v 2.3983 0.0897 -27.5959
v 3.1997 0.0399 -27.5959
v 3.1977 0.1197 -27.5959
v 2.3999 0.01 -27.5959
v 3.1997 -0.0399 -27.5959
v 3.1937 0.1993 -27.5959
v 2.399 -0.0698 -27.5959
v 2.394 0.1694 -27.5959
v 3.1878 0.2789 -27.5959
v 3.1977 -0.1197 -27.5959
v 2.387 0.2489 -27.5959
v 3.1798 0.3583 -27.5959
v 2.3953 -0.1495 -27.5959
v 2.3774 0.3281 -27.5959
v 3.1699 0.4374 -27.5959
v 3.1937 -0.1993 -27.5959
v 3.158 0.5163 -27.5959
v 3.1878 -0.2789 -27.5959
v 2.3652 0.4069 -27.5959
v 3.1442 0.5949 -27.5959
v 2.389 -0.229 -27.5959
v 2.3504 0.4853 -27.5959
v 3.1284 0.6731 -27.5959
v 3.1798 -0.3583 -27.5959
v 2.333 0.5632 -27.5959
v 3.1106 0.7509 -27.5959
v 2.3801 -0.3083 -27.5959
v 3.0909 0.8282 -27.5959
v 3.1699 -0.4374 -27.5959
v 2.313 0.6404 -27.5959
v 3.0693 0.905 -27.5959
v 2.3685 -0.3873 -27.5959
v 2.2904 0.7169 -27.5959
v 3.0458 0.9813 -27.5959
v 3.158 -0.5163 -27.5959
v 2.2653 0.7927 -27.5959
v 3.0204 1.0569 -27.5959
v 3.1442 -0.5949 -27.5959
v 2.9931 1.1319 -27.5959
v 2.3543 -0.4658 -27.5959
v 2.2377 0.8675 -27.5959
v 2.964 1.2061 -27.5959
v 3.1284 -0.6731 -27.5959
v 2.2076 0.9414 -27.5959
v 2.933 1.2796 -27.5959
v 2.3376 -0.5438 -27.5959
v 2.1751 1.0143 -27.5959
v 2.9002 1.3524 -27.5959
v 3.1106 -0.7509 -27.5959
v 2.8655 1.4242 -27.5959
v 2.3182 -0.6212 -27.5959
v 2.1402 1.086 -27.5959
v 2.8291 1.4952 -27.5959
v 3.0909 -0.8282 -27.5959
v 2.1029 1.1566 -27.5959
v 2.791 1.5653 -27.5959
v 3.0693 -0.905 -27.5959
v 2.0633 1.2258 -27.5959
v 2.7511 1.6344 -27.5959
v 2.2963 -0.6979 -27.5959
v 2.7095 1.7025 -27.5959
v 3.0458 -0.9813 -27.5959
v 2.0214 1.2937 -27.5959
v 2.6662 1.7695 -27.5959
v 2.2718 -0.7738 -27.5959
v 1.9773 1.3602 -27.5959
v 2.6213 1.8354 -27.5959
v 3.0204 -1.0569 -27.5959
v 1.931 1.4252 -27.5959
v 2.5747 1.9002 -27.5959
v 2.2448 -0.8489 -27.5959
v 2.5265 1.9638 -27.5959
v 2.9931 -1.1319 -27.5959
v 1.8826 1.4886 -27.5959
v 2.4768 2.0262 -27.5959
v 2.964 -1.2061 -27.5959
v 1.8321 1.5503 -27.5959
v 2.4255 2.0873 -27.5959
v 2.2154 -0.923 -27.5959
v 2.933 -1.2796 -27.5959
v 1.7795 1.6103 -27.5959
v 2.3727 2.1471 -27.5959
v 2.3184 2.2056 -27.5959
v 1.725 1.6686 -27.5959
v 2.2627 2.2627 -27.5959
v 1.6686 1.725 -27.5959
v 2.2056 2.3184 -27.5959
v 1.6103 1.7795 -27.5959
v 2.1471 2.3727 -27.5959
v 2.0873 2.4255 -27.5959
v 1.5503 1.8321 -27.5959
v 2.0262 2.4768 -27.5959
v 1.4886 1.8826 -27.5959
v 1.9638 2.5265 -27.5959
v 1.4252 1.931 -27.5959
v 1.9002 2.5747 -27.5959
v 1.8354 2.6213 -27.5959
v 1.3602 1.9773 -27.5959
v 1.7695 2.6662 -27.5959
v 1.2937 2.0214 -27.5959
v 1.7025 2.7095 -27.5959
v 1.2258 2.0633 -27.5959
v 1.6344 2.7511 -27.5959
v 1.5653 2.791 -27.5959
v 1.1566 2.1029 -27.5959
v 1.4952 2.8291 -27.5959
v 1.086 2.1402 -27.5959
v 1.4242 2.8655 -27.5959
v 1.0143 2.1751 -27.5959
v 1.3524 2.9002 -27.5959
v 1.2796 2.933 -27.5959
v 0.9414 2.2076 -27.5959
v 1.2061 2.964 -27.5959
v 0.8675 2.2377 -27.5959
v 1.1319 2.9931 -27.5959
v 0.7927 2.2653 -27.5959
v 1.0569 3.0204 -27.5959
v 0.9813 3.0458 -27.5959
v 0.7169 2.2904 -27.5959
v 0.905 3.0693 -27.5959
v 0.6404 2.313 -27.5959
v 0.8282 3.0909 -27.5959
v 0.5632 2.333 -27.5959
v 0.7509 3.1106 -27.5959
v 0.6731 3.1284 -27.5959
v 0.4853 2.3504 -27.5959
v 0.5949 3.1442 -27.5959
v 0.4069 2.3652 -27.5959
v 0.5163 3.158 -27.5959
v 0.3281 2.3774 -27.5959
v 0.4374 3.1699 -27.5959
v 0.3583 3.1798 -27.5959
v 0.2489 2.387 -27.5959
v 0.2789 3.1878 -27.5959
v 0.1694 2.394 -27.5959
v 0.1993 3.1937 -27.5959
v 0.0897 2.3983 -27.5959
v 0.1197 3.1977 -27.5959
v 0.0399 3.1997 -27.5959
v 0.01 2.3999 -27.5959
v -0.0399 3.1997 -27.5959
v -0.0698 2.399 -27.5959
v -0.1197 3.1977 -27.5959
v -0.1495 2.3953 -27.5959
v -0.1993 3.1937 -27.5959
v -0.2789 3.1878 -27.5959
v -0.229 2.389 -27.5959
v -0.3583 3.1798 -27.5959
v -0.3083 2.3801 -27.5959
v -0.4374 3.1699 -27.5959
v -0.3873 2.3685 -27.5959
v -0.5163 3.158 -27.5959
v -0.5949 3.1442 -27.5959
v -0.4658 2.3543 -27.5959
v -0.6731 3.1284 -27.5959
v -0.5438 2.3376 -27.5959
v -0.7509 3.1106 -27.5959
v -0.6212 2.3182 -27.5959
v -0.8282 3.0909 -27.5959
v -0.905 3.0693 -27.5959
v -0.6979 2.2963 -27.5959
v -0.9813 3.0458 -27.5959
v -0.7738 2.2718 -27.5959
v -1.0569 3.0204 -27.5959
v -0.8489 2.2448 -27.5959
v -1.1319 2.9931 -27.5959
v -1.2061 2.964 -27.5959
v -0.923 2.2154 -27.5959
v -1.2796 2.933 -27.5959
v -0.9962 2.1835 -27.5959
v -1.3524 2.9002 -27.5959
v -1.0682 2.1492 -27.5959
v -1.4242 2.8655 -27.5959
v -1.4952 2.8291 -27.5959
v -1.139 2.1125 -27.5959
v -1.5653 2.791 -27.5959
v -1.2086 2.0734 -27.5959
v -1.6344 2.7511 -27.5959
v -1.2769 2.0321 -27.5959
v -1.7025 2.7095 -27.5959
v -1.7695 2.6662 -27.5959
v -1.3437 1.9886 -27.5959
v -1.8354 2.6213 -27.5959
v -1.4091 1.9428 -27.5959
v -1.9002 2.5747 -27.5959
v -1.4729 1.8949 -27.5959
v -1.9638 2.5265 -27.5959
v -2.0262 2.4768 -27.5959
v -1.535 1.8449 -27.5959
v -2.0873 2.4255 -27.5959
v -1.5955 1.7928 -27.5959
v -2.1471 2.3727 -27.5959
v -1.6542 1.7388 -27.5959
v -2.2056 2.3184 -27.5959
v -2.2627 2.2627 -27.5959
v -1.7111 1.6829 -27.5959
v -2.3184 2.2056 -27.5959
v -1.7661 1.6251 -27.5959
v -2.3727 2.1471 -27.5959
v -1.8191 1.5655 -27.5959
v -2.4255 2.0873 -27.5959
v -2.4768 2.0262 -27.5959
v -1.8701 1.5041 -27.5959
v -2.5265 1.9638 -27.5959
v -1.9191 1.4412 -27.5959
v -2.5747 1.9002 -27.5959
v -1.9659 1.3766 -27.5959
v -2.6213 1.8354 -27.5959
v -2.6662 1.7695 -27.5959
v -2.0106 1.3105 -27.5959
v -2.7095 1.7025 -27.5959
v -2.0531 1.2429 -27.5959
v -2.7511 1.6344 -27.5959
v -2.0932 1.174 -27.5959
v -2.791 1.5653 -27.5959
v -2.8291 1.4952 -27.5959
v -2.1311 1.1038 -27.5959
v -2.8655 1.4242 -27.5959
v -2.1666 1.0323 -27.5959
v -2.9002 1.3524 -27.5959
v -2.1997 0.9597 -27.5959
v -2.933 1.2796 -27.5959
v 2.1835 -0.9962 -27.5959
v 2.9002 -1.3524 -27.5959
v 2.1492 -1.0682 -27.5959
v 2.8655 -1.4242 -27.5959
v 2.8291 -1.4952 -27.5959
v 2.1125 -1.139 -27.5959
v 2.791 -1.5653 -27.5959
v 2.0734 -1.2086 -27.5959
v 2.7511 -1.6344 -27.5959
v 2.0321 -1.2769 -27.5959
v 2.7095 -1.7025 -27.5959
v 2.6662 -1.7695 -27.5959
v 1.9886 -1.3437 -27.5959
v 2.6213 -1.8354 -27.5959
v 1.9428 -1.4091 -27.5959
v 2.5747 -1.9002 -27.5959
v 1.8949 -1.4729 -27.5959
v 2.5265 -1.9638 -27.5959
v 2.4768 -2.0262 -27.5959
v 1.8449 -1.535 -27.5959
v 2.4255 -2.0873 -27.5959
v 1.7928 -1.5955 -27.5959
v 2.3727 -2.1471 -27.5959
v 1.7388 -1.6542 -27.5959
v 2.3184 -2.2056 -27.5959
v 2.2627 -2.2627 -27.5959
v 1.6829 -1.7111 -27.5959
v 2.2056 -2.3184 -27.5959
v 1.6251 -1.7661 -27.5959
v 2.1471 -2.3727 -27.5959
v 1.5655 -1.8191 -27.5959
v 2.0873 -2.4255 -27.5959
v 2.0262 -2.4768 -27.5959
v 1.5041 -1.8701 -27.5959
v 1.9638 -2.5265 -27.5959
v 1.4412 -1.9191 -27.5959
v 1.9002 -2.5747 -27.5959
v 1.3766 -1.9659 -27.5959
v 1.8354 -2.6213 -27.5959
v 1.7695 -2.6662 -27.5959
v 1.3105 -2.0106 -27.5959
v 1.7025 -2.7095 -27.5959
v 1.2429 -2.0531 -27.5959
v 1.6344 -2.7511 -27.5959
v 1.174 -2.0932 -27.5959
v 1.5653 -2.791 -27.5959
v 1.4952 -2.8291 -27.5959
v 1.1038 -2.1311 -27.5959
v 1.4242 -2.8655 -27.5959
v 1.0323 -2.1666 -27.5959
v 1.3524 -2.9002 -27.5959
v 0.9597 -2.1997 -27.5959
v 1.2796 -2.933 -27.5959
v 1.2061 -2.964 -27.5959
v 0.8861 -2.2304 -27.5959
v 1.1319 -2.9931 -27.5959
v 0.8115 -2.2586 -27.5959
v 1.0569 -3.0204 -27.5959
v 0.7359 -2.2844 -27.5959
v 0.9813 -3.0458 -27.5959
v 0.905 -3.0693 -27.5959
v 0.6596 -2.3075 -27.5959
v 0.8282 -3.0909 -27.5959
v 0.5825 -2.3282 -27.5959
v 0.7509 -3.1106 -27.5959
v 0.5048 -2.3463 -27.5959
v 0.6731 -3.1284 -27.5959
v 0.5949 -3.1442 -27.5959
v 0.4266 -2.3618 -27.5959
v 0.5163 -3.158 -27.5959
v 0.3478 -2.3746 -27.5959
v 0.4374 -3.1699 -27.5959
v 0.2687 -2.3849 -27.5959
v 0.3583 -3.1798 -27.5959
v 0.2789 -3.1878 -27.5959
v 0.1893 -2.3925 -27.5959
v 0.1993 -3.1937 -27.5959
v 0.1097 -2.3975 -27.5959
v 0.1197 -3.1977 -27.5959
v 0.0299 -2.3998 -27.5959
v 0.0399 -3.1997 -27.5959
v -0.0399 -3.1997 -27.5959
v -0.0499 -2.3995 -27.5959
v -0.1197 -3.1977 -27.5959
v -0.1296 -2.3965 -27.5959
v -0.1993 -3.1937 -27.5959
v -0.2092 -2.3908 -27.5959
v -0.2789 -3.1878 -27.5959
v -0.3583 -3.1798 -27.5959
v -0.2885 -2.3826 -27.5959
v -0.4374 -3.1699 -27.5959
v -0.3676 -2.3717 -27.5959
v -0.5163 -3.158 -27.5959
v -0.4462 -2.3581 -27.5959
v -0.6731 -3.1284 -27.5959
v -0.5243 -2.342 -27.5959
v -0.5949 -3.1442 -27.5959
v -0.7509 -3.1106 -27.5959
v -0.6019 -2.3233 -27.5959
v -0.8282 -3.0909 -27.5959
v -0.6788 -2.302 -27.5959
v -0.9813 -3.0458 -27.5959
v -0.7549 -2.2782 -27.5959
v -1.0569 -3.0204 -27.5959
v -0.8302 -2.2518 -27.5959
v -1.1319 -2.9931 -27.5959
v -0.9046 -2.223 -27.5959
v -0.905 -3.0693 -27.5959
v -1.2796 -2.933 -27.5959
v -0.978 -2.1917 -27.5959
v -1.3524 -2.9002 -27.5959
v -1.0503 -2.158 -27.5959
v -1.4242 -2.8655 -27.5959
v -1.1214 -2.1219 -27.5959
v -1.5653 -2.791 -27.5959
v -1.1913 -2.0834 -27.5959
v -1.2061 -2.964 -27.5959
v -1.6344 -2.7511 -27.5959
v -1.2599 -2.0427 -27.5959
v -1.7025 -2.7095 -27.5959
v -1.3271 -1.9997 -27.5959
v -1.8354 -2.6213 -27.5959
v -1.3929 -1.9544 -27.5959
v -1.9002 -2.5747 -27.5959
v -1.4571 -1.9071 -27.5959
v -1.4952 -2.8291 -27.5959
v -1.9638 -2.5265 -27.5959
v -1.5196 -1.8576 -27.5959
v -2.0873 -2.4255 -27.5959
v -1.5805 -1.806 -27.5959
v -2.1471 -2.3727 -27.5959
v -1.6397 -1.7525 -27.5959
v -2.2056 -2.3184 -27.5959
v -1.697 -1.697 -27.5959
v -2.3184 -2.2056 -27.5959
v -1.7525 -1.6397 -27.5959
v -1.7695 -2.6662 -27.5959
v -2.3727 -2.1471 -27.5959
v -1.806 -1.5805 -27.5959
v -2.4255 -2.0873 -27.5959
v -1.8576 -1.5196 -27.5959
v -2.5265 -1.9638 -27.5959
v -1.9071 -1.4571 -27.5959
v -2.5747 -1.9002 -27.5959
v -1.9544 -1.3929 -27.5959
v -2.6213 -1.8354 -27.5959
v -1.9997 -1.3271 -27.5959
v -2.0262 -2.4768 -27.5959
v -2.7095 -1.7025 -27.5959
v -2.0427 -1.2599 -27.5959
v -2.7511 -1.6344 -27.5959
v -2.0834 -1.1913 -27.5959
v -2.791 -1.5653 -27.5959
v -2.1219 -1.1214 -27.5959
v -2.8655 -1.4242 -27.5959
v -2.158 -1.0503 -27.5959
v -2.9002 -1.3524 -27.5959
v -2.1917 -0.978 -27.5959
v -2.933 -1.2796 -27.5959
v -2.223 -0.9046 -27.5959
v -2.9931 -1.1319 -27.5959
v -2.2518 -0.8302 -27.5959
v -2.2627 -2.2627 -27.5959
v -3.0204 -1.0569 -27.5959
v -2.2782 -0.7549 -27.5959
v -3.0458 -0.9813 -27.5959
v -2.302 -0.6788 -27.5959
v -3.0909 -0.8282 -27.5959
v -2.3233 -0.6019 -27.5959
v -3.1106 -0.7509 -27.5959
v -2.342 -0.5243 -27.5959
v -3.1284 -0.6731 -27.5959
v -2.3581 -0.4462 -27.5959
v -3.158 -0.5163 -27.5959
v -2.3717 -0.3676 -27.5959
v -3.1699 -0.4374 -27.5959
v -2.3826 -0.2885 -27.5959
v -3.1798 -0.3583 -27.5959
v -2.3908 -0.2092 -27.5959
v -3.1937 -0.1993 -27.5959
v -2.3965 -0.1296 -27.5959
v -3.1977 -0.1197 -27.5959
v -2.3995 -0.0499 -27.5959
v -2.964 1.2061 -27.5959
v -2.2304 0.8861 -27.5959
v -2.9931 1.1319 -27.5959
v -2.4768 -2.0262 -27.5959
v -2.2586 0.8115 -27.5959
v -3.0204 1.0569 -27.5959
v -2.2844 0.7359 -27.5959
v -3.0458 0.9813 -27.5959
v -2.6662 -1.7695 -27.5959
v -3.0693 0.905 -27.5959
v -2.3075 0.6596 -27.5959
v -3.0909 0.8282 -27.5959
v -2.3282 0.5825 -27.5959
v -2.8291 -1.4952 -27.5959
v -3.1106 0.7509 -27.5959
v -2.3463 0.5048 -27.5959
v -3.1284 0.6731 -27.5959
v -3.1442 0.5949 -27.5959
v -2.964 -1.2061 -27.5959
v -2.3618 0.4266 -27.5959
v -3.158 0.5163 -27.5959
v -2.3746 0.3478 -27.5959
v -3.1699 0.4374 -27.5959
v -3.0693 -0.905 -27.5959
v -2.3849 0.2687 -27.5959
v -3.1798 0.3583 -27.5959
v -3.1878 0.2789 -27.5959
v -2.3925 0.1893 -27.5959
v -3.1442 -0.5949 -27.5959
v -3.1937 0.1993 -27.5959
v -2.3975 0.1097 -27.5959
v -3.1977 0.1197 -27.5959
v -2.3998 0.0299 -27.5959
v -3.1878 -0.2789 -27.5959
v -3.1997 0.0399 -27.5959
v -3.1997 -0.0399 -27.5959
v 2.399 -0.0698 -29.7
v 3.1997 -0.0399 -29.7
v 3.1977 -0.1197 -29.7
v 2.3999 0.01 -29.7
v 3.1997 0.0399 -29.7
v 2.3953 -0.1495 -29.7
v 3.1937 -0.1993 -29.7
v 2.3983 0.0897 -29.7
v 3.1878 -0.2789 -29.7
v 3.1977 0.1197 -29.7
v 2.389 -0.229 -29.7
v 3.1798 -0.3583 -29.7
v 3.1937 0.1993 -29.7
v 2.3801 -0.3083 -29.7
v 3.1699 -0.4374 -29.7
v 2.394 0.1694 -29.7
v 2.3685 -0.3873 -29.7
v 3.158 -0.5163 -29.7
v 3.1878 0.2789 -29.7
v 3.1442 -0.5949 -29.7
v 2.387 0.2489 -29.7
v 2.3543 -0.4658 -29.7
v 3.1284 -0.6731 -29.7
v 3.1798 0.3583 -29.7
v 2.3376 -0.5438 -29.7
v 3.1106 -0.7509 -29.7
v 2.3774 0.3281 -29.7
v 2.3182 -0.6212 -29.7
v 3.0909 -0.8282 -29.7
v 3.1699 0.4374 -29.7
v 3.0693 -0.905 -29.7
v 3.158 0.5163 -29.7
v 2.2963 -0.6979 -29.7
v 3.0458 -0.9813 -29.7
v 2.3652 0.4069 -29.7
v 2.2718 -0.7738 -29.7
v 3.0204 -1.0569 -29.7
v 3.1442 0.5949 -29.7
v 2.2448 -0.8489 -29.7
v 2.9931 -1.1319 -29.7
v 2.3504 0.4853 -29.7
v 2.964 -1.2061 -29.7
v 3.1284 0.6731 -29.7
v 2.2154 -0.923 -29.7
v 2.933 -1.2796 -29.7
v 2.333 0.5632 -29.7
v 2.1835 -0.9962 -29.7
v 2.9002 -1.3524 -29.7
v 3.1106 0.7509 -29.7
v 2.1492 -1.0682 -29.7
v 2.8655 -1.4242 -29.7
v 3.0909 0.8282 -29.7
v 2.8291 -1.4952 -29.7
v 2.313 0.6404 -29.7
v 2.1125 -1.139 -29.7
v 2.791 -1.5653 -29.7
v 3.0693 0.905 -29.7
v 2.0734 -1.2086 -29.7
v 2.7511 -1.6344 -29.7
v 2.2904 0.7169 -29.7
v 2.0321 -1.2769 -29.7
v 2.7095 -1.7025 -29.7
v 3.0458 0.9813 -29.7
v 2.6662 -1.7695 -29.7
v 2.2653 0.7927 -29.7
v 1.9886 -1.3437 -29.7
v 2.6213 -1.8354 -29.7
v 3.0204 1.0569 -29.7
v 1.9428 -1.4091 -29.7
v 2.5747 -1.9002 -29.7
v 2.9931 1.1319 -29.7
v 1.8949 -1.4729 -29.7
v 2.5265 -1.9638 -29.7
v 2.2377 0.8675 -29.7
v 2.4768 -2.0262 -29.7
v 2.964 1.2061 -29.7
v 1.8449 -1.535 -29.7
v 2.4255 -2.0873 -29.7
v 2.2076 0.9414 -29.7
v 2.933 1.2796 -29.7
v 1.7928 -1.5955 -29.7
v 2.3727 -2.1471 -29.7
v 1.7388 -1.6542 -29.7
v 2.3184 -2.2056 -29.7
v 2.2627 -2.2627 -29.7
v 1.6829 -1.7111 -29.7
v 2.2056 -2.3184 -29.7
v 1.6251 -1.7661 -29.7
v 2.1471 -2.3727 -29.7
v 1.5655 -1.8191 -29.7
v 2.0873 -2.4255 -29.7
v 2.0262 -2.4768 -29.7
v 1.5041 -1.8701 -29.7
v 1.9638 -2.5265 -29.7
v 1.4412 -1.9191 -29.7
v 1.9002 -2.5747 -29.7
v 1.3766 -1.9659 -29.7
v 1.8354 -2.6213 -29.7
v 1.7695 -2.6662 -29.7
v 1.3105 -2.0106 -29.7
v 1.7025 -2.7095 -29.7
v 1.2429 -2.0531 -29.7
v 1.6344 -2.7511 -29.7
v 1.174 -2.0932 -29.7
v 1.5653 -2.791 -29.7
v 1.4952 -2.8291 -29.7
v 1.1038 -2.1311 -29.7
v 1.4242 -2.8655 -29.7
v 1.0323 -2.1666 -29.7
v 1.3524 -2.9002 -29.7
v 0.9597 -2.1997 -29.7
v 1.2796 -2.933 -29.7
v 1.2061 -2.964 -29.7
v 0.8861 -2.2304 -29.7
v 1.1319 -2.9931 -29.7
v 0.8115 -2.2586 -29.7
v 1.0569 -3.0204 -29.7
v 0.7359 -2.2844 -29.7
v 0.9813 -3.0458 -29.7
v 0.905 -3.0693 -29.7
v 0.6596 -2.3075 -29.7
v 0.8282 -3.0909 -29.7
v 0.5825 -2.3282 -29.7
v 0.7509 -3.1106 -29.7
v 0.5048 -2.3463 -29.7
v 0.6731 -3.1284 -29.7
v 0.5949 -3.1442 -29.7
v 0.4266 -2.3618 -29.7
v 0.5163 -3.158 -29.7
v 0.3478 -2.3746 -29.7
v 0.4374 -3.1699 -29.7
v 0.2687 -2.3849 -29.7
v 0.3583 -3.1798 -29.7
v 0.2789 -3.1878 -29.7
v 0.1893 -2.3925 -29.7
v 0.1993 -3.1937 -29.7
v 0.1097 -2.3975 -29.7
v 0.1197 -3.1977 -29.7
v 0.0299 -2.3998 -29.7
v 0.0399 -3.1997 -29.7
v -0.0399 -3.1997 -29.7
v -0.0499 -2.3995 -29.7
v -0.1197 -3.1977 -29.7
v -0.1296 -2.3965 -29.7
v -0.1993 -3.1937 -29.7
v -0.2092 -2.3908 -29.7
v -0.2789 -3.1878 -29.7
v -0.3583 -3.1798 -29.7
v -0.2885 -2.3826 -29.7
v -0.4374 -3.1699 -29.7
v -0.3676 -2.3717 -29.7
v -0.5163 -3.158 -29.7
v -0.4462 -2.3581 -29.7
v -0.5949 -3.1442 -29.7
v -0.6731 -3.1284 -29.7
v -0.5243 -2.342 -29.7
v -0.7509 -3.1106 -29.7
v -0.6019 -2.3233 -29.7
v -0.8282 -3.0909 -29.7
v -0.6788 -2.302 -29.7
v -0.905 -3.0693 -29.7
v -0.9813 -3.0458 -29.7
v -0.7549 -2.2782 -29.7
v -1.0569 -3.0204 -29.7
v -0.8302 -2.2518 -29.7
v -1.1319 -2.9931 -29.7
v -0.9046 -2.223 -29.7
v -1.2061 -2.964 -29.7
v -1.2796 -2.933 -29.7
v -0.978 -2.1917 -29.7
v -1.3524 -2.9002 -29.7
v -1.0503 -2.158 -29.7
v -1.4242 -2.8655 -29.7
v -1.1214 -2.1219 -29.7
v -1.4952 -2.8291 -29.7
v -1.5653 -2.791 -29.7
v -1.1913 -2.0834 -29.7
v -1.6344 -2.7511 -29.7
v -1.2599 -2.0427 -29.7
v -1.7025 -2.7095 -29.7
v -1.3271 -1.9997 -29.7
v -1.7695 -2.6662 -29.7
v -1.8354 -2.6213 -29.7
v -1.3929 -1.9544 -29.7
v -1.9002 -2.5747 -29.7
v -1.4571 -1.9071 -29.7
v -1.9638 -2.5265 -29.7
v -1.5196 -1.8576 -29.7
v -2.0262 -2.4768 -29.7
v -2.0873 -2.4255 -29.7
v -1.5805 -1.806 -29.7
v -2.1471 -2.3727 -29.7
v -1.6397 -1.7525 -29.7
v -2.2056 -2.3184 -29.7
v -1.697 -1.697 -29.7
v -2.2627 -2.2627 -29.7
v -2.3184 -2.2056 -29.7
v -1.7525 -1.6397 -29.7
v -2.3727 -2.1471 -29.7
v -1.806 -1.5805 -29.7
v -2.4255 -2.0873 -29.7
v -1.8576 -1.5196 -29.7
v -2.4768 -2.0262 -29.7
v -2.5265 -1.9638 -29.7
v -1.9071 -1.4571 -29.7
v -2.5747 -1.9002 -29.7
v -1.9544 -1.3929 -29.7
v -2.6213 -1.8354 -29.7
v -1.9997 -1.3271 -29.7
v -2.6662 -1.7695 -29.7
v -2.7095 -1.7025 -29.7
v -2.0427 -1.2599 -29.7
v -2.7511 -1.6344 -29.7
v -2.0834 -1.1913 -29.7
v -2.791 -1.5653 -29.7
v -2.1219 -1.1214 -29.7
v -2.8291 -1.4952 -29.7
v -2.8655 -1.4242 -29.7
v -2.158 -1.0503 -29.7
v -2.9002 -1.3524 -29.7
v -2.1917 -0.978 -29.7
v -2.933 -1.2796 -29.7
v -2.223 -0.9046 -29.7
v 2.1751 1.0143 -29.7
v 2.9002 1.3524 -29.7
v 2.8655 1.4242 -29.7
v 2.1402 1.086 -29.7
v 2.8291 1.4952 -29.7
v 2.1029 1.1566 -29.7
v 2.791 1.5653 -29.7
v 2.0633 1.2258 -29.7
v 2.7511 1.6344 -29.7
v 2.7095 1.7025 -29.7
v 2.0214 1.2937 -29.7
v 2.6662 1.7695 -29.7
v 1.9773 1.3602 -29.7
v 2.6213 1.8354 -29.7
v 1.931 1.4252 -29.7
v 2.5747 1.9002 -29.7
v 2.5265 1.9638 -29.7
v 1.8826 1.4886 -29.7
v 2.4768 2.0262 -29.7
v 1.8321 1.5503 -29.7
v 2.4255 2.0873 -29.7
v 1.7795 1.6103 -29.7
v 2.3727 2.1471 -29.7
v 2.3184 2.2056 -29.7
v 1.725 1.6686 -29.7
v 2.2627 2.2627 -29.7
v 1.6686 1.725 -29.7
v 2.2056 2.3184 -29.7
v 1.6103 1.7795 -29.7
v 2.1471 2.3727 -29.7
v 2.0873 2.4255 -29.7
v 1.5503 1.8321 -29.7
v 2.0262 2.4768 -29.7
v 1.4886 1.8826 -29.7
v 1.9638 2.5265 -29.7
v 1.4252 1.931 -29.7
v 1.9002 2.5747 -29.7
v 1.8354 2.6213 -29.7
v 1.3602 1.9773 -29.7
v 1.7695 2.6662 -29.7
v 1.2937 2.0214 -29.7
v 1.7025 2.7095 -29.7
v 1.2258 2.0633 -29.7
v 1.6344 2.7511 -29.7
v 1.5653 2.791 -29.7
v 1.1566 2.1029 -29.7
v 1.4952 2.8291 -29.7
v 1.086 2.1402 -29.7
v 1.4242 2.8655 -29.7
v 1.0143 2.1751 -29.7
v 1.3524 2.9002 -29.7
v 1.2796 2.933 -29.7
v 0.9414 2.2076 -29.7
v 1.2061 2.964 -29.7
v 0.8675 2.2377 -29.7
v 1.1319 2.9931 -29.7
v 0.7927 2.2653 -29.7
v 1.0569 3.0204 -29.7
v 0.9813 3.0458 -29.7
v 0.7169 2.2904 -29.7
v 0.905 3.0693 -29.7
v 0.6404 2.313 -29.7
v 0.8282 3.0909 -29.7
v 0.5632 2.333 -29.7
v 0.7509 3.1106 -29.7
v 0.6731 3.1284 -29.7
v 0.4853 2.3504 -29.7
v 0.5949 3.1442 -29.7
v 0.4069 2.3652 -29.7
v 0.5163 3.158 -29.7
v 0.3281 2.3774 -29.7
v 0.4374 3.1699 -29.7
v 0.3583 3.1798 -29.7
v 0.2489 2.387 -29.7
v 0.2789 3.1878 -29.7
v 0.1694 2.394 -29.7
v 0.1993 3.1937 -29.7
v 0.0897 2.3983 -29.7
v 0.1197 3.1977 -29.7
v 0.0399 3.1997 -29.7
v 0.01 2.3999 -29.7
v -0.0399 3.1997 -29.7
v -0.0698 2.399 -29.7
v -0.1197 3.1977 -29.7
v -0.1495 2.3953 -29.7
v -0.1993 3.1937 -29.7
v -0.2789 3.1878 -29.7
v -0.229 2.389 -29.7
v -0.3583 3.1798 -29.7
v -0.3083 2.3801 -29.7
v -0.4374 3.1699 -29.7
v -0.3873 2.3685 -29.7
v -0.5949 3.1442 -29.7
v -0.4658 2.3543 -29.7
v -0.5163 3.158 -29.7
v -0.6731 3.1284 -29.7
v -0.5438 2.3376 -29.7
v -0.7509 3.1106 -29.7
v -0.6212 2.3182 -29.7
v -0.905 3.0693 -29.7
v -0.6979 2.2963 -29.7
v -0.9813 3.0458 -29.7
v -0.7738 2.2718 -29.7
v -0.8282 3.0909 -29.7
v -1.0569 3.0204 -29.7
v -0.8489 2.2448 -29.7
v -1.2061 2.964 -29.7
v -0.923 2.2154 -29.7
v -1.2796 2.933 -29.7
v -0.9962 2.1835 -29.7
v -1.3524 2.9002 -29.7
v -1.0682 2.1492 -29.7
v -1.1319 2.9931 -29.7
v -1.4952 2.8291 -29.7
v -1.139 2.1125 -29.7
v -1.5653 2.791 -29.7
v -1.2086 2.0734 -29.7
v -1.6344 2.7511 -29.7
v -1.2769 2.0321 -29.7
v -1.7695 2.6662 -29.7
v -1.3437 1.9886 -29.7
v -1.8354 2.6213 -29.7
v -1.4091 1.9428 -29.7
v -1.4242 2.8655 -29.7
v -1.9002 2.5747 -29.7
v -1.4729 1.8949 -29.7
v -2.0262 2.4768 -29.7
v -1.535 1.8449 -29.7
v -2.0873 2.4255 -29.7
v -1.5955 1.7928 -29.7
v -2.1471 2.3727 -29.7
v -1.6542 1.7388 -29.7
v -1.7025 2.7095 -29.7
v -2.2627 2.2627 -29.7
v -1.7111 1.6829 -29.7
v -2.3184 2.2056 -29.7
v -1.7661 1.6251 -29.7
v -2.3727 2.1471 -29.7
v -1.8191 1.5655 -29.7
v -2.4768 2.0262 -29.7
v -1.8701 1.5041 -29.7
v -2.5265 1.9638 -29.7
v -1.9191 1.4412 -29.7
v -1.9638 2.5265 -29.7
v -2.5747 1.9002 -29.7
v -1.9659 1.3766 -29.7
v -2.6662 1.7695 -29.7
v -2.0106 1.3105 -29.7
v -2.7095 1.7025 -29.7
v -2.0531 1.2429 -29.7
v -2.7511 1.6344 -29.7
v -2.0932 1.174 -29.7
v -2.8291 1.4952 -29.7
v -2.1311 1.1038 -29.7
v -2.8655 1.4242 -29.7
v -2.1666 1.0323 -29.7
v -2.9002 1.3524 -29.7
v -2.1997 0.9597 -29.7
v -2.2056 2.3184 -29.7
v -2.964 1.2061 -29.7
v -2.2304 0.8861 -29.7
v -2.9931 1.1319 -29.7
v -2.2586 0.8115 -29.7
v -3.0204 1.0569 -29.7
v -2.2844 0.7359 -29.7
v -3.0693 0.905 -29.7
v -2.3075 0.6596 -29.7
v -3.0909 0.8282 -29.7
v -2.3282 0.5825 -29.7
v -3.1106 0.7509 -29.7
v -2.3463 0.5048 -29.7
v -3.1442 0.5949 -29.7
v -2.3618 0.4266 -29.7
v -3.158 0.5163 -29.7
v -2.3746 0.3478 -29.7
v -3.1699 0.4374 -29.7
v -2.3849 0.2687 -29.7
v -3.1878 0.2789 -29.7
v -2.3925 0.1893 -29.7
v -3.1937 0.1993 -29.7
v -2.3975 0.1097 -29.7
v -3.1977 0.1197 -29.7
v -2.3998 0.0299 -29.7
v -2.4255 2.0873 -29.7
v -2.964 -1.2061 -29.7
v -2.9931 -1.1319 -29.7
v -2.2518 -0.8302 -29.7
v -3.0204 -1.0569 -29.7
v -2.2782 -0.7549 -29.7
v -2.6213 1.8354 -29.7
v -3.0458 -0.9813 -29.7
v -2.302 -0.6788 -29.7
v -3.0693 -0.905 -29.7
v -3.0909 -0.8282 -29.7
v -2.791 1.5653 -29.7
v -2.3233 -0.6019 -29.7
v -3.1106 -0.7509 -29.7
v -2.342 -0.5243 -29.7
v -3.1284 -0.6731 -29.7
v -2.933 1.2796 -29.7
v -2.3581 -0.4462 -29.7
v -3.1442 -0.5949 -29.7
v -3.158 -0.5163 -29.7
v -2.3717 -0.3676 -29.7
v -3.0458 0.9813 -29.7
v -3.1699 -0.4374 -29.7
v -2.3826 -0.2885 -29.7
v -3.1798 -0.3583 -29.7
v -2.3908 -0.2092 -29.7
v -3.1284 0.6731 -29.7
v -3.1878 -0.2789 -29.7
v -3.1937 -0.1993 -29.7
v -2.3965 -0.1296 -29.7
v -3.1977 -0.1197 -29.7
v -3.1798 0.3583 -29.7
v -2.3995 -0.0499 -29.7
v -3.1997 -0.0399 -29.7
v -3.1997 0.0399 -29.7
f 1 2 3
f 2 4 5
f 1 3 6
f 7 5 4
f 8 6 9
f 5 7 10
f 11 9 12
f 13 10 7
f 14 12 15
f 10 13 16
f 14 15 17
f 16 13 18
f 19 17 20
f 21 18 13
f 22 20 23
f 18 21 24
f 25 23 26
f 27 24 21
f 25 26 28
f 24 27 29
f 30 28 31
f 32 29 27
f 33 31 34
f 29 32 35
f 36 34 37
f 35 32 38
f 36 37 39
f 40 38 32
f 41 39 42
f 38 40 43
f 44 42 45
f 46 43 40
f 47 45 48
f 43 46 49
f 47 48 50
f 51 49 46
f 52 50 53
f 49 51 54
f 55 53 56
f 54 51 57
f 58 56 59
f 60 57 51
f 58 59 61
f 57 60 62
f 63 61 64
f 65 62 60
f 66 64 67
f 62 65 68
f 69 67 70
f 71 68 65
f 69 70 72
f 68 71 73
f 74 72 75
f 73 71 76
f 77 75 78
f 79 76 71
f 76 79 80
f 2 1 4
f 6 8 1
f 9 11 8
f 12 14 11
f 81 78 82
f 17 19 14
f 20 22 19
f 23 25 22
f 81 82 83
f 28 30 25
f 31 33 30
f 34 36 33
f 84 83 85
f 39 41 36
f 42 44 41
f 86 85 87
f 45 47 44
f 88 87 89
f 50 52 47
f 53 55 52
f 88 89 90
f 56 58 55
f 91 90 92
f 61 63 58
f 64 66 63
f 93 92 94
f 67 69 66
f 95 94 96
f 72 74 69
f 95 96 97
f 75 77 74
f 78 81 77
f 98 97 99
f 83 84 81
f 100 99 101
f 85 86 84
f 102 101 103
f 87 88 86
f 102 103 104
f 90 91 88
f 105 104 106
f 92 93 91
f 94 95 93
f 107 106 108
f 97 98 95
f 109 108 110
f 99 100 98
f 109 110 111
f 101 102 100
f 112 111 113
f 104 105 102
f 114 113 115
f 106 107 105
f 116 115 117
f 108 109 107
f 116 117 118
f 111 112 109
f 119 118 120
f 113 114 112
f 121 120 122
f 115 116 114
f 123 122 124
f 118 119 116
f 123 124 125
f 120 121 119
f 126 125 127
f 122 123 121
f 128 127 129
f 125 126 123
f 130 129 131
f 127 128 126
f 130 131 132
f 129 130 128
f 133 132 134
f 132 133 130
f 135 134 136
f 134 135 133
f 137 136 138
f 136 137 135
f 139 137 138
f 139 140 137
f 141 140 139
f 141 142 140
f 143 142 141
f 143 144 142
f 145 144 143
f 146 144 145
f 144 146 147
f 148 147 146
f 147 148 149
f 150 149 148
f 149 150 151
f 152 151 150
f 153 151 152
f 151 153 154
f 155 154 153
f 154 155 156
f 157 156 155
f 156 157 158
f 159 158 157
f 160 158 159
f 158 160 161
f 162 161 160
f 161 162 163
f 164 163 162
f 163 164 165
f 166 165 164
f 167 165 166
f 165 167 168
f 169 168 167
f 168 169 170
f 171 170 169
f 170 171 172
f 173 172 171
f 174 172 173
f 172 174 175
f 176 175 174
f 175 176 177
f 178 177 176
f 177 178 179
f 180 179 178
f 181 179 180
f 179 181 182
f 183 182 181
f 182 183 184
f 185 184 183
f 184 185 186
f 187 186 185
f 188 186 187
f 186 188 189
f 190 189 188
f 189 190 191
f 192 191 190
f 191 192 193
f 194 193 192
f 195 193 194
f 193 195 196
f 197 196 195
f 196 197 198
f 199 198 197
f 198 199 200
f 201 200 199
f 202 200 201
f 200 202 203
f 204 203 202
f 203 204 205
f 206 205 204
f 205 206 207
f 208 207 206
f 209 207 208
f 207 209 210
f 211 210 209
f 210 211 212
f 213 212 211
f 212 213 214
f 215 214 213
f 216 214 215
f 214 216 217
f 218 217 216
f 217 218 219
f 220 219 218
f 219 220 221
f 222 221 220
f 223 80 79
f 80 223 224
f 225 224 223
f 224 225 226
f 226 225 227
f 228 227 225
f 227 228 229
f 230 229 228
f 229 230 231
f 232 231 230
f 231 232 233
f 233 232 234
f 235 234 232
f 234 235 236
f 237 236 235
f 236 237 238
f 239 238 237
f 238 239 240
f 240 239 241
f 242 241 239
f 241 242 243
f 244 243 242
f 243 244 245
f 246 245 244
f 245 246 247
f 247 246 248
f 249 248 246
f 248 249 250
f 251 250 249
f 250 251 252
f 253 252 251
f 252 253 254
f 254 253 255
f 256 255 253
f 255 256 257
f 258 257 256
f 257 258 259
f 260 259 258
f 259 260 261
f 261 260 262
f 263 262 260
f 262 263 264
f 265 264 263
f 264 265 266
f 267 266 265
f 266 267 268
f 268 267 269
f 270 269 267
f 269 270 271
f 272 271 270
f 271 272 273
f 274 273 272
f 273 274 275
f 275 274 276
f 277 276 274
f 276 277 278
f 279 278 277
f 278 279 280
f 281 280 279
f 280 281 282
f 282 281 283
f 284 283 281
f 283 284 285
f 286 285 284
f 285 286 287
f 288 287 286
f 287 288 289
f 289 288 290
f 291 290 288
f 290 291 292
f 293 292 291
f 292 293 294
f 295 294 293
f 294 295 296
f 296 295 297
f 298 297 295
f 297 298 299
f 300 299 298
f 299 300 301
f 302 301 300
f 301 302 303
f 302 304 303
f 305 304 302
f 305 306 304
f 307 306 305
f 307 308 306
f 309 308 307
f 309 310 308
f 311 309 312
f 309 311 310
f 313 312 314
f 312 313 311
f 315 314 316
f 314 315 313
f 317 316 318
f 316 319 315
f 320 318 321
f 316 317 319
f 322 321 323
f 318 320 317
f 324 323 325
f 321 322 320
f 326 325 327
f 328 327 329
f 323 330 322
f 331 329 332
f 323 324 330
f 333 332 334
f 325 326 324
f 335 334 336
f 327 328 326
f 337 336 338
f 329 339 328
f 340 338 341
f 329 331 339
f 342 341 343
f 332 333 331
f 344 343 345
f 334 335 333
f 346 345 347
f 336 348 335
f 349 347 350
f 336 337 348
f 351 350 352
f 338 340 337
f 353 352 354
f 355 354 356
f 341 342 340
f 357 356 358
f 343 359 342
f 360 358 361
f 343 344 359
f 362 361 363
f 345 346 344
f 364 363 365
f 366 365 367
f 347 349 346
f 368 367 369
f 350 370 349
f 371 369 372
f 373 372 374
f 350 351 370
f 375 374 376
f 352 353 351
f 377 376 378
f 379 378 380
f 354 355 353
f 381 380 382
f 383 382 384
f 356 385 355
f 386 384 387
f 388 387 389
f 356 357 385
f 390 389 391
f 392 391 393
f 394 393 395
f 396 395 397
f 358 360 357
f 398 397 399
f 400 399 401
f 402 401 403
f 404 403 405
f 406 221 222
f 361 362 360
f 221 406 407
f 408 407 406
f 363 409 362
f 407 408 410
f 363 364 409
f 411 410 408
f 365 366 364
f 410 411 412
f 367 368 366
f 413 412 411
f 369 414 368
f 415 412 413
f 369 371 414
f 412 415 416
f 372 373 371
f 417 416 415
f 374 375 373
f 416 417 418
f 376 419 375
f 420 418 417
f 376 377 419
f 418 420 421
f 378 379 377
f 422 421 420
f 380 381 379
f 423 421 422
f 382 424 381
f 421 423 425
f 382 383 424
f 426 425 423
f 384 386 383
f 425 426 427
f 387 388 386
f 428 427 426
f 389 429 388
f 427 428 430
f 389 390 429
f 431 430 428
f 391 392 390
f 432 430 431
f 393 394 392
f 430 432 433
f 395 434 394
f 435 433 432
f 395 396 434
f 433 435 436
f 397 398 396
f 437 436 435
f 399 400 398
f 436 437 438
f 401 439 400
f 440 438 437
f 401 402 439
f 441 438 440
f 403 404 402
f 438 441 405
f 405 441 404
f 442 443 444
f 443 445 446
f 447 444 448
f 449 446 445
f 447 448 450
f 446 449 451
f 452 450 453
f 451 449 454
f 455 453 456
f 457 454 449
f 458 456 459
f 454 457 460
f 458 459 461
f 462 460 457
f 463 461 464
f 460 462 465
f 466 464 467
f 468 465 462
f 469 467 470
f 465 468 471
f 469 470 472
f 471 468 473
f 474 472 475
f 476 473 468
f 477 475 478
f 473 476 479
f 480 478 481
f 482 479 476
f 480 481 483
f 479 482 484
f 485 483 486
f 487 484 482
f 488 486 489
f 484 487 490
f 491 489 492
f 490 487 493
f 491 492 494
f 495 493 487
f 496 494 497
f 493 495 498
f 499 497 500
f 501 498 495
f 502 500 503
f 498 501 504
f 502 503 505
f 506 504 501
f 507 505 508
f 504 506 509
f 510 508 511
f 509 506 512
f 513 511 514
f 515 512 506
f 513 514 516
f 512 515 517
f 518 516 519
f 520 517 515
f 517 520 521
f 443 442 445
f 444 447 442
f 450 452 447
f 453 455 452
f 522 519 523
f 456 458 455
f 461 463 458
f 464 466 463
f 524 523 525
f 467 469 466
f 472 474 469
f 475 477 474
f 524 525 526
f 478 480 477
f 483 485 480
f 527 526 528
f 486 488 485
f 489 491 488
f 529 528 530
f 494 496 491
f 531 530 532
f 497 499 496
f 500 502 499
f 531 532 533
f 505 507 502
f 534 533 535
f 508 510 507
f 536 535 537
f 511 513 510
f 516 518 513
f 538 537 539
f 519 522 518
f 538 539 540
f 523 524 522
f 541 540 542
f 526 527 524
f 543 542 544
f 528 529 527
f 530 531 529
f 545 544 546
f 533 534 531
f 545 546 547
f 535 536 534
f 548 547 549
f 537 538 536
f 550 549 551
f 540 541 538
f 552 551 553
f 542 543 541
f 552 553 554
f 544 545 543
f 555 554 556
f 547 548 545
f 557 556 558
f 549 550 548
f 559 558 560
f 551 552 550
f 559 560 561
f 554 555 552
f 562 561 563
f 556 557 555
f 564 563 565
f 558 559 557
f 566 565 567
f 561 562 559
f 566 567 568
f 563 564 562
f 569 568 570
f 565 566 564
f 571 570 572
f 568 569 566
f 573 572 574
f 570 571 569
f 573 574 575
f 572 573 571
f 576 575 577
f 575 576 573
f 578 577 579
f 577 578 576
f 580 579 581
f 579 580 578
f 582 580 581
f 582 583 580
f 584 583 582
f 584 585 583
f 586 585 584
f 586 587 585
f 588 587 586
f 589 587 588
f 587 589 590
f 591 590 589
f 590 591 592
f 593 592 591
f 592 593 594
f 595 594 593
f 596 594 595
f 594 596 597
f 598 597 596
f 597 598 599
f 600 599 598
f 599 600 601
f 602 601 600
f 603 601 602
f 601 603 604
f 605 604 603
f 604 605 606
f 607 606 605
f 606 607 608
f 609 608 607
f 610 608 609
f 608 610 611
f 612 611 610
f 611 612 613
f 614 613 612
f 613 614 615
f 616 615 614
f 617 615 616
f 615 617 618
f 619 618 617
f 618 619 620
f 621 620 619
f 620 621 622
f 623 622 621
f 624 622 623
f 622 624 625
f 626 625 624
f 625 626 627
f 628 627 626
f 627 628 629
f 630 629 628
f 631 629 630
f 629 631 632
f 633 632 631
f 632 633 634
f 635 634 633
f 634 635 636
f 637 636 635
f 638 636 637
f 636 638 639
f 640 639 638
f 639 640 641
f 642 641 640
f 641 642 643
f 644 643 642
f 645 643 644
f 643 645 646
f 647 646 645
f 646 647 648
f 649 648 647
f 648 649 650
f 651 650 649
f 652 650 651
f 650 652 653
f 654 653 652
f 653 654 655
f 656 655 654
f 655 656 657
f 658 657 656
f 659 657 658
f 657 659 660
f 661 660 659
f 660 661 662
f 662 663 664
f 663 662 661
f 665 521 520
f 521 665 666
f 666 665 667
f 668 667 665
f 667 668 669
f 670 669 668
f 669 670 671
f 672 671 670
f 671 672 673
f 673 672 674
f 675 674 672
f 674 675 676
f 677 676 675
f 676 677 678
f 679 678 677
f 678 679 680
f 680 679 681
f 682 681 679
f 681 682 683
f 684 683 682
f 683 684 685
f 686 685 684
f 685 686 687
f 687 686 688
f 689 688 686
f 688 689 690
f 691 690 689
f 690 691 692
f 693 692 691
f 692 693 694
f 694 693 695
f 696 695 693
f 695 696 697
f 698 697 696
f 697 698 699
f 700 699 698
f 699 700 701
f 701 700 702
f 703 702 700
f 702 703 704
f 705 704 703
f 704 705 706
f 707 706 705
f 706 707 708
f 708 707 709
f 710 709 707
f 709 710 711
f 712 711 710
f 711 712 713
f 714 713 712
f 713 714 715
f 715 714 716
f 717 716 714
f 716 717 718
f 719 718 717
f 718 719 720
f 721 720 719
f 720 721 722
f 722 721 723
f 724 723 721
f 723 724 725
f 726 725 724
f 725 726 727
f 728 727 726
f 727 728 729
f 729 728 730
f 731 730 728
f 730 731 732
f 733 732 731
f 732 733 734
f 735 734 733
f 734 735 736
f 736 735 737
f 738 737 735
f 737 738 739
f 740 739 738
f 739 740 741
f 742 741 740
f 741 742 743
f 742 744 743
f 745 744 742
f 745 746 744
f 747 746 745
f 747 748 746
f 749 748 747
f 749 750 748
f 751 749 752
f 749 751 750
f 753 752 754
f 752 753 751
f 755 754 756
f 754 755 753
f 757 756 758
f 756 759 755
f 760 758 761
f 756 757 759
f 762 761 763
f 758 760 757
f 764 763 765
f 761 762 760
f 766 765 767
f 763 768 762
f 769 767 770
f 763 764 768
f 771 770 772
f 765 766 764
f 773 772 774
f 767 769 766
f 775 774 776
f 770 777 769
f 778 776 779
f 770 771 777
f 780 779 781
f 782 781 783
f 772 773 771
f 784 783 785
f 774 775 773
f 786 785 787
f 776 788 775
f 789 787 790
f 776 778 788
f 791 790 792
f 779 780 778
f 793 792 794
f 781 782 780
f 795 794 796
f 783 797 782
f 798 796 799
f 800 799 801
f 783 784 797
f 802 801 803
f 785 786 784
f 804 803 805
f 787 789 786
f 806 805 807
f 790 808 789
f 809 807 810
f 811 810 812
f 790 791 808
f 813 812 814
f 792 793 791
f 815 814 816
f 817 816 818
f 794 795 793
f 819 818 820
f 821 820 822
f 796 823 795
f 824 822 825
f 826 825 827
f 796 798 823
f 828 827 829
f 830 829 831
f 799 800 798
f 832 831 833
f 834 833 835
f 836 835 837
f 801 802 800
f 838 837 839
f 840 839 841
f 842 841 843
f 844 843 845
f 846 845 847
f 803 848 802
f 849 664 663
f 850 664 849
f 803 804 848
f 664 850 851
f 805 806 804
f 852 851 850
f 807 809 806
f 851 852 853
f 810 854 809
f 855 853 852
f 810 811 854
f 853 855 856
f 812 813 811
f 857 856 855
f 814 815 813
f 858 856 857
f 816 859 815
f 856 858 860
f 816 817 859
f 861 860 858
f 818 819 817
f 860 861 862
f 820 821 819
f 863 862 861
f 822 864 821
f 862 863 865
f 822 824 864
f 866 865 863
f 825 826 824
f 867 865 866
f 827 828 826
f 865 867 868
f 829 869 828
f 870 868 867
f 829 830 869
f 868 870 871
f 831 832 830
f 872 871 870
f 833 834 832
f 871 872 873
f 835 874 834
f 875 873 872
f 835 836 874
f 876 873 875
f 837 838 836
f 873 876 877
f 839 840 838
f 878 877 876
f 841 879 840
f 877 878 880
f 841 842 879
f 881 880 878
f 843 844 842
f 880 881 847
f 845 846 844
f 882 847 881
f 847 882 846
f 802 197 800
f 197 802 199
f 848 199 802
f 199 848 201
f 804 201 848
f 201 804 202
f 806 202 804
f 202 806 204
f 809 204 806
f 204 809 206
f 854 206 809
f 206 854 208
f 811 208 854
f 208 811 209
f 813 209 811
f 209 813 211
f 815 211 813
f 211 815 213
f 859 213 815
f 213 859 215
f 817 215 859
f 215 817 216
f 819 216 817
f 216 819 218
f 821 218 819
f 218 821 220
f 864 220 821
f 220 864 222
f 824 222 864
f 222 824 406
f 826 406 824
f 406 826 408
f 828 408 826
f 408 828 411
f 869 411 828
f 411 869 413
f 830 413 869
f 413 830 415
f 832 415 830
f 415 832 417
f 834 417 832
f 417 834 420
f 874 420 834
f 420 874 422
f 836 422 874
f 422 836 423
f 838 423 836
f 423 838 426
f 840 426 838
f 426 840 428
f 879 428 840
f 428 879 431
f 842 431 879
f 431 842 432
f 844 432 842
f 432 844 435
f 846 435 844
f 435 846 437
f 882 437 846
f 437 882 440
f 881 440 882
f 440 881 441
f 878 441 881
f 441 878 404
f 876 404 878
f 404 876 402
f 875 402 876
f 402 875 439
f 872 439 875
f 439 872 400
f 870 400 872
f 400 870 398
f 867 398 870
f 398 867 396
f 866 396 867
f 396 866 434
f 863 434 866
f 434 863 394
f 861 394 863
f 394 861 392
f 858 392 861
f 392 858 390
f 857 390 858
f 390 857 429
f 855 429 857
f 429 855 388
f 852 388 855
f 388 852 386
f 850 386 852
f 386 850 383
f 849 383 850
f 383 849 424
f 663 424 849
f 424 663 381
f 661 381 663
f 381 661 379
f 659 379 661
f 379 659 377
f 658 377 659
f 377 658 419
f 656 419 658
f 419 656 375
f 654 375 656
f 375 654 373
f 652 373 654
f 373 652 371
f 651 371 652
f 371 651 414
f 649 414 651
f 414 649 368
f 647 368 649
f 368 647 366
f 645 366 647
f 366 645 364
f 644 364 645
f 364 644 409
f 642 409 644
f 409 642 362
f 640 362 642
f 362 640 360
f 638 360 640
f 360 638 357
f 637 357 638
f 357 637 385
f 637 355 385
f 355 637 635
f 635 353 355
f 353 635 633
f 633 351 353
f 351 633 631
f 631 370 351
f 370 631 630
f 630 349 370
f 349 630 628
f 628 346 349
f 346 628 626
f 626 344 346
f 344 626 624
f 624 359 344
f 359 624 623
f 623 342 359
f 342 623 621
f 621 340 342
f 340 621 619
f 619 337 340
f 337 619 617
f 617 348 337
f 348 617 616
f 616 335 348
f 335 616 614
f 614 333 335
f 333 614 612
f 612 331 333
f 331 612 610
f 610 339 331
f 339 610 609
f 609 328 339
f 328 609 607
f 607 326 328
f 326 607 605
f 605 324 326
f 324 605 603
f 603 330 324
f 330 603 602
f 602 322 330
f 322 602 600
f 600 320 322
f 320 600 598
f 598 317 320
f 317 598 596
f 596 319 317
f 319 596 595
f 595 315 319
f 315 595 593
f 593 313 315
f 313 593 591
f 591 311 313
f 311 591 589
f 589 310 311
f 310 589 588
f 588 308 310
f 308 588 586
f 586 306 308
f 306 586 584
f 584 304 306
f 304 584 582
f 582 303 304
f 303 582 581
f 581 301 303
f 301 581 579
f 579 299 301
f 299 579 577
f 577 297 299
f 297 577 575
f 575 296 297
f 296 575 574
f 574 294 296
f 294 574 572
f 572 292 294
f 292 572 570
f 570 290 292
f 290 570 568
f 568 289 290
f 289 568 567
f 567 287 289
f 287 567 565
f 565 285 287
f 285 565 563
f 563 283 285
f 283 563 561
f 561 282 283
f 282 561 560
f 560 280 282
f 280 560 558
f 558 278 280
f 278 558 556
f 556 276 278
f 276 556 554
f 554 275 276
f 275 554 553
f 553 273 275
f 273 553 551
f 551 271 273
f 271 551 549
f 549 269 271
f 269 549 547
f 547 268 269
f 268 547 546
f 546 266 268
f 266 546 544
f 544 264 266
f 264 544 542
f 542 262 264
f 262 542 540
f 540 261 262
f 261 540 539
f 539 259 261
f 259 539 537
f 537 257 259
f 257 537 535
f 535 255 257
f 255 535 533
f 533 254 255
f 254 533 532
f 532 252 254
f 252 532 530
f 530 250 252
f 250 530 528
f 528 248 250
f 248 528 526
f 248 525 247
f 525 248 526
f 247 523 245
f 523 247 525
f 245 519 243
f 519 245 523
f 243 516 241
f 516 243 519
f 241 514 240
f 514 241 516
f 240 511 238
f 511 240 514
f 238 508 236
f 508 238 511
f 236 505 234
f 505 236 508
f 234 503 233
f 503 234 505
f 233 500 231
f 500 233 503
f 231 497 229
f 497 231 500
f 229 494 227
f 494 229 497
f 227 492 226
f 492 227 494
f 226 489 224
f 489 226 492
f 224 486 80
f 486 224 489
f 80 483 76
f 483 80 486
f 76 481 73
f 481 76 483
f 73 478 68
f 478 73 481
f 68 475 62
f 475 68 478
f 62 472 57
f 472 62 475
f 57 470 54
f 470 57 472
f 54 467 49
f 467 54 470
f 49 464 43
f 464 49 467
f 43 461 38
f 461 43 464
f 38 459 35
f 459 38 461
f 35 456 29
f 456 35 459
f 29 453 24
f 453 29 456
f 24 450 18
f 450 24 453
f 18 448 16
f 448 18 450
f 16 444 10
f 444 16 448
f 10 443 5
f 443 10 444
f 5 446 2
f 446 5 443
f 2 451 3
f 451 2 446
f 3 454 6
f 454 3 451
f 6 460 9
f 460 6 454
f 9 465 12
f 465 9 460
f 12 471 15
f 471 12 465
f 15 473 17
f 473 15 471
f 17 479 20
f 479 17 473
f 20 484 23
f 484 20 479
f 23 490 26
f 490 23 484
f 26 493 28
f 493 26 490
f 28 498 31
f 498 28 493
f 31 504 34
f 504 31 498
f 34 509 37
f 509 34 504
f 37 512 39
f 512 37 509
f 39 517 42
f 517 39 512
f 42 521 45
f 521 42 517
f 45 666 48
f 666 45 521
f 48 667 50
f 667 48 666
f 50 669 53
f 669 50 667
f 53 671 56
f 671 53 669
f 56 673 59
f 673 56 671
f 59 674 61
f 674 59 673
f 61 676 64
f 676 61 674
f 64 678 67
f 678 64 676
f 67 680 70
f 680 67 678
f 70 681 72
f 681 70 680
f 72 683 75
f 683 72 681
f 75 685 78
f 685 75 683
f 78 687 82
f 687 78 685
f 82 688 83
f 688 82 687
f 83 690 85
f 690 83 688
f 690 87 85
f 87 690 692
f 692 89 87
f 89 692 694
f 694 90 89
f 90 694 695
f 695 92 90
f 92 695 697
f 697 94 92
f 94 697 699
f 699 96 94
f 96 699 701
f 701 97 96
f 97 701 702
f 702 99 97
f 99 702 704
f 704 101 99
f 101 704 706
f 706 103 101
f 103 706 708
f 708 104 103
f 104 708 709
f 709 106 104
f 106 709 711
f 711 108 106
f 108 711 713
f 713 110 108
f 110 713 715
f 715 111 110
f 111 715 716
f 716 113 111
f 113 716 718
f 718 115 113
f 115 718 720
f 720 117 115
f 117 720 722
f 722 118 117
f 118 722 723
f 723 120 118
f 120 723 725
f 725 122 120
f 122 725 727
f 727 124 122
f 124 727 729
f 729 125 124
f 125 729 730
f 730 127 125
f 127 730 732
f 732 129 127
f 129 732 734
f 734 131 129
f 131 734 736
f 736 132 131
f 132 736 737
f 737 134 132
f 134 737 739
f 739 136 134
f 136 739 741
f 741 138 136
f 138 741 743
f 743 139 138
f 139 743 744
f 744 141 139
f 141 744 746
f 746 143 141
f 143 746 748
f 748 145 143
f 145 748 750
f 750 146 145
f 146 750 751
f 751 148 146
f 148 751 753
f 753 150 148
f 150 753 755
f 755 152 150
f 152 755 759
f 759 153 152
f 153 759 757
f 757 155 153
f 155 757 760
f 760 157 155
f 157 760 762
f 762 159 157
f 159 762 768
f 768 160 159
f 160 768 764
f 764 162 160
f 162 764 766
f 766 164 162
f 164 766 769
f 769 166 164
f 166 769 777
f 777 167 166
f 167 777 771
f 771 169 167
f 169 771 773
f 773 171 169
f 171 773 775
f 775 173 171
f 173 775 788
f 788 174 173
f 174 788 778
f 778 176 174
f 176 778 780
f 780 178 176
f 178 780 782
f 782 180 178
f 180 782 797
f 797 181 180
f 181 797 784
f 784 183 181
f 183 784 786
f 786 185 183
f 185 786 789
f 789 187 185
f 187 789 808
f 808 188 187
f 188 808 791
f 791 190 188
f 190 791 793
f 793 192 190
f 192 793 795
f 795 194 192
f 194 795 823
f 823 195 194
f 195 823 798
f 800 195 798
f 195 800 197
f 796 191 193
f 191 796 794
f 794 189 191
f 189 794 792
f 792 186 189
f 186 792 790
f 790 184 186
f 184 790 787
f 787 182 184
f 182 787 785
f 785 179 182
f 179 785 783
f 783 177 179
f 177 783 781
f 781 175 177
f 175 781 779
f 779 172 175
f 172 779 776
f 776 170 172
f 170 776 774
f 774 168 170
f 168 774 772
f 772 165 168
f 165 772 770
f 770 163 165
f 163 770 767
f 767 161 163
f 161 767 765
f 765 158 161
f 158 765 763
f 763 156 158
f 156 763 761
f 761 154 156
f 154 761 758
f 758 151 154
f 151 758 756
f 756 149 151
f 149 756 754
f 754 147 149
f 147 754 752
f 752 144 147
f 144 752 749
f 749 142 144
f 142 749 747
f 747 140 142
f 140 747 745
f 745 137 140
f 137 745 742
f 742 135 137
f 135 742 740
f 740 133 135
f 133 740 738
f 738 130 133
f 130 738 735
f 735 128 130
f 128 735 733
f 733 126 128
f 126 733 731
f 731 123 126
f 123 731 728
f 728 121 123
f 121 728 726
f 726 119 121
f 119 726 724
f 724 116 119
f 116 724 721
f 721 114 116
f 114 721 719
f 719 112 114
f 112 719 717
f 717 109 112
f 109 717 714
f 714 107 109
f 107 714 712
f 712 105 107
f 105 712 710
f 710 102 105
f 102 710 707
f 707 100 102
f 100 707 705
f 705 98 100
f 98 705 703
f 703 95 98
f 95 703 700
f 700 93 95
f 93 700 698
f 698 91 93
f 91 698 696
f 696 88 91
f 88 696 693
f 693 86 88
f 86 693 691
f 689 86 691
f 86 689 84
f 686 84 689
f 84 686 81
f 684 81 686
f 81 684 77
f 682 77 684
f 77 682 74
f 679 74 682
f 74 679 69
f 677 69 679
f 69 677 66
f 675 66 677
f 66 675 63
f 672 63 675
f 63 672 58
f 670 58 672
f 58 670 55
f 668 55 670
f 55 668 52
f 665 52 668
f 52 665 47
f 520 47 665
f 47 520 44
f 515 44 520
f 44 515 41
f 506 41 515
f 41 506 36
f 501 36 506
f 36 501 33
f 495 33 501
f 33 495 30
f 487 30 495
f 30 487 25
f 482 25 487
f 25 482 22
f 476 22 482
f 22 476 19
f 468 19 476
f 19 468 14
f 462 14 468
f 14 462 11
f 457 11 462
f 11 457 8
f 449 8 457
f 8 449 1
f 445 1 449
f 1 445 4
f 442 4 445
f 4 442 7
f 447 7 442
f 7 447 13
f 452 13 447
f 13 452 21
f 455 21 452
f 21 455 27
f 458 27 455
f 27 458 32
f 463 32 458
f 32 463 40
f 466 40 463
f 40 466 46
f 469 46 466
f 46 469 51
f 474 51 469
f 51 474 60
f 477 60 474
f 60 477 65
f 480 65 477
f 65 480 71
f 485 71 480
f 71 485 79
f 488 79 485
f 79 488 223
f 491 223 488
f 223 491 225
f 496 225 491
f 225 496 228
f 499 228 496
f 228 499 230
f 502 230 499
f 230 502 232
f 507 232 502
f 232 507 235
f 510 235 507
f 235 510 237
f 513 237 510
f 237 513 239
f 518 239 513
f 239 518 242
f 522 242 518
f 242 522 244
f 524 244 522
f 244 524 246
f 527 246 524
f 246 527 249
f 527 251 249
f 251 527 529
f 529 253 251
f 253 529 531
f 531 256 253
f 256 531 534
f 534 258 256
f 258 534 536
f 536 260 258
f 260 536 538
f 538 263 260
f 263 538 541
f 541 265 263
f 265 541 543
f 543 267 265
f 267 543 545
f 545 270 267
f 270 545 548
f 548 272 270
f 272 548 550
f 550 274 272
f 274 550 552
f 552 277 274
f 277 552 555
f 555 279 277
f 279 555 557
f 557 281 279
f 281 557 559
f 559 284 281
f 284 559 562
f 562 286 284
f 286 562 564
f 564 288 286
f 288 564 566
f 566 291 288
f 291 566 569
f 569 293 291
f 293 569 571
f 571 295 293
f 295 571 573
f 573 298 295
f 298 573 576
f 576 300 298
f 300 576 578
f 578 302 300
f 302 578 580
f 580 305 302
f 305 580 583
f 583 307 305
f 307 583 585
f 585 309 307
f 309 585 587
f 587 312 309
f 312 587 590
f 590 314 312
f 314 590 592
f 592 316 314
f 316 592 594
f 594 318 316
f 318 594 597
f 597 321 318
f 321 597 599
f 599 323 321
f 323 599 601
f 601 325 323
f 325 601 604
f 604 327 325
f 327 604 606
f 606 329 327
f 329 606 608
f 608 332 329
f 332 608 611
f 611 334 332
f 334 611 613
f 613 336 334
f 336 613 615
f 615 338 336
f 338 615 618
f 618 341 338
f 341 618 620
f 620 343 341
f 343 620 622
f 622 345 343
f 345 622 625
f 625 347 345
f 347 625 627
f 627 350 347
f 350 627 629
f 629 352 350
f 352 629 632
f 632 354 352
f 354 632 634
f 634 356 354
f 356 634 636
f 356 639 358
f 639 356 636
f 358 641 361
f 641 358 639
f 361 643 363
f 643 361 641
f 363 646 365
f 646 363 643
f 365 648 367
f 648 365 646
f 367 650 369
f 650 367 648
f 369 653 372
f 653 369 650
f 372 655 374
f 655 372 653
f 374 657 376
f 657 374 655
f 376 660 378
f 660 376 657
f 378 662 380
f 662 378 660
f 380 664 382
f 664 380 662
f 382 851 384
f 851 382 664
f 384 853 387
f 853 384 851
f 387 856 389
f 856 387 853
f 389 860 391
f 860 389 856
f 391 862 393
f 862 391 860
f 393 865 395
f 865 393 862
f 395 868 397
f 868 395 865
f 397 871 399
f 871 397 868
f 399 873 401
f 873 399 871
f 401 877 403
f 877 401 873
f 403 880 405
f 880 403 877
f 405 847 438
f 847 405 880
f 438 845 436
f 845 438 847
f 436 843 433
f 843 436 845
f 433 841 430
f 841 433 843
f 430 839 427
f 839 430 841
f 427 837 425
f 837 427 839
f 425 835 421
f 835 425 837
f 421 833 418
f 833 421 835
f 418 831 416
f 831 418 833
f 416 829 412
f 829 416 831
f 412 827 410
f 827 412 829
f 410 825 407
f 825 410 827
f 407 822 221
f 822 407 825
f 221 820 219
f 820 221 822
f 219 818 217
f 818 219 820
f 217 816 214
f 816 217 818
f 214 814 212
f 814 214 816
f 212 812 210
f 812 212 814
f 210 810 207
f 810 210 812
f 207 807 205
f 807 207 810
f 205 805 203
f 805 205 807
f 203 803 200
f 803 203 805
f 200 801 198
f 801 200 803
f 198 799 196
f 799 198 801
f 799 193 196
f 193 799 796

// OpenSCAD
use <../lib.scad>
use <48245.scad>
use <71861.scad>
$fa=1; $fs=0.2;
function ldraw_lib__48245c01(realsolid=false) = [
// 0 Bucket  2 x  2 with Raised Handle
// 0 Name: 48245c01.dat
// 0 Author: Max Martin Richter [MMR1988]
// 0 !LDRAW_ORG Shortcut UPDATE 2012-03
// 0 !LICENSE Licensed under CC BY 2.0 and CC BY 4.0 : see CAreadme.txt
// 
// 0 !HELP Grip is at y = 0
// 0 !HELP Part is designed for using it in hands or hooks
// 
// 0 BFC CERTIFY CCW
  [0,"BFC","CERTIFY"],
  [0,"BFC","CCW"],
// 
// 0 !CATEGORY Container
// 
// 0 !HISTORY 2012-12-28 [PTadmin] Official Update 2012-03
// 
// 
// 1 16 0 66.25 0 0.7071 0 0.7071 0 1 0 -0.7071 0 0.7071 48245.dat
  [1,16,0,66.25,0,0.7071,0,0.7071,0,1,0,-0.7071,0,0.7071, ldraw_lib__48245(realsolid)],
// 1 16 0 31.25 0 1 0 0 0 1 0 0 0 1 71861.dat
  [1,16,0,31.25,0,1,0,0,0,1,0,0,0,1, ldraw_lib__71861(realsolid)],
];
module ldraw_lib__48245c01(step=0, col=false, unit=2/5, alt=false, line=0.2, solid=!$preview)
    makepoly(ldraw_lib__48245c01(solid), step=step, col=col, unit=unit, alt=alt, line=line, solid=solid);
ldraw_lib__48245c01(line=0.2);
